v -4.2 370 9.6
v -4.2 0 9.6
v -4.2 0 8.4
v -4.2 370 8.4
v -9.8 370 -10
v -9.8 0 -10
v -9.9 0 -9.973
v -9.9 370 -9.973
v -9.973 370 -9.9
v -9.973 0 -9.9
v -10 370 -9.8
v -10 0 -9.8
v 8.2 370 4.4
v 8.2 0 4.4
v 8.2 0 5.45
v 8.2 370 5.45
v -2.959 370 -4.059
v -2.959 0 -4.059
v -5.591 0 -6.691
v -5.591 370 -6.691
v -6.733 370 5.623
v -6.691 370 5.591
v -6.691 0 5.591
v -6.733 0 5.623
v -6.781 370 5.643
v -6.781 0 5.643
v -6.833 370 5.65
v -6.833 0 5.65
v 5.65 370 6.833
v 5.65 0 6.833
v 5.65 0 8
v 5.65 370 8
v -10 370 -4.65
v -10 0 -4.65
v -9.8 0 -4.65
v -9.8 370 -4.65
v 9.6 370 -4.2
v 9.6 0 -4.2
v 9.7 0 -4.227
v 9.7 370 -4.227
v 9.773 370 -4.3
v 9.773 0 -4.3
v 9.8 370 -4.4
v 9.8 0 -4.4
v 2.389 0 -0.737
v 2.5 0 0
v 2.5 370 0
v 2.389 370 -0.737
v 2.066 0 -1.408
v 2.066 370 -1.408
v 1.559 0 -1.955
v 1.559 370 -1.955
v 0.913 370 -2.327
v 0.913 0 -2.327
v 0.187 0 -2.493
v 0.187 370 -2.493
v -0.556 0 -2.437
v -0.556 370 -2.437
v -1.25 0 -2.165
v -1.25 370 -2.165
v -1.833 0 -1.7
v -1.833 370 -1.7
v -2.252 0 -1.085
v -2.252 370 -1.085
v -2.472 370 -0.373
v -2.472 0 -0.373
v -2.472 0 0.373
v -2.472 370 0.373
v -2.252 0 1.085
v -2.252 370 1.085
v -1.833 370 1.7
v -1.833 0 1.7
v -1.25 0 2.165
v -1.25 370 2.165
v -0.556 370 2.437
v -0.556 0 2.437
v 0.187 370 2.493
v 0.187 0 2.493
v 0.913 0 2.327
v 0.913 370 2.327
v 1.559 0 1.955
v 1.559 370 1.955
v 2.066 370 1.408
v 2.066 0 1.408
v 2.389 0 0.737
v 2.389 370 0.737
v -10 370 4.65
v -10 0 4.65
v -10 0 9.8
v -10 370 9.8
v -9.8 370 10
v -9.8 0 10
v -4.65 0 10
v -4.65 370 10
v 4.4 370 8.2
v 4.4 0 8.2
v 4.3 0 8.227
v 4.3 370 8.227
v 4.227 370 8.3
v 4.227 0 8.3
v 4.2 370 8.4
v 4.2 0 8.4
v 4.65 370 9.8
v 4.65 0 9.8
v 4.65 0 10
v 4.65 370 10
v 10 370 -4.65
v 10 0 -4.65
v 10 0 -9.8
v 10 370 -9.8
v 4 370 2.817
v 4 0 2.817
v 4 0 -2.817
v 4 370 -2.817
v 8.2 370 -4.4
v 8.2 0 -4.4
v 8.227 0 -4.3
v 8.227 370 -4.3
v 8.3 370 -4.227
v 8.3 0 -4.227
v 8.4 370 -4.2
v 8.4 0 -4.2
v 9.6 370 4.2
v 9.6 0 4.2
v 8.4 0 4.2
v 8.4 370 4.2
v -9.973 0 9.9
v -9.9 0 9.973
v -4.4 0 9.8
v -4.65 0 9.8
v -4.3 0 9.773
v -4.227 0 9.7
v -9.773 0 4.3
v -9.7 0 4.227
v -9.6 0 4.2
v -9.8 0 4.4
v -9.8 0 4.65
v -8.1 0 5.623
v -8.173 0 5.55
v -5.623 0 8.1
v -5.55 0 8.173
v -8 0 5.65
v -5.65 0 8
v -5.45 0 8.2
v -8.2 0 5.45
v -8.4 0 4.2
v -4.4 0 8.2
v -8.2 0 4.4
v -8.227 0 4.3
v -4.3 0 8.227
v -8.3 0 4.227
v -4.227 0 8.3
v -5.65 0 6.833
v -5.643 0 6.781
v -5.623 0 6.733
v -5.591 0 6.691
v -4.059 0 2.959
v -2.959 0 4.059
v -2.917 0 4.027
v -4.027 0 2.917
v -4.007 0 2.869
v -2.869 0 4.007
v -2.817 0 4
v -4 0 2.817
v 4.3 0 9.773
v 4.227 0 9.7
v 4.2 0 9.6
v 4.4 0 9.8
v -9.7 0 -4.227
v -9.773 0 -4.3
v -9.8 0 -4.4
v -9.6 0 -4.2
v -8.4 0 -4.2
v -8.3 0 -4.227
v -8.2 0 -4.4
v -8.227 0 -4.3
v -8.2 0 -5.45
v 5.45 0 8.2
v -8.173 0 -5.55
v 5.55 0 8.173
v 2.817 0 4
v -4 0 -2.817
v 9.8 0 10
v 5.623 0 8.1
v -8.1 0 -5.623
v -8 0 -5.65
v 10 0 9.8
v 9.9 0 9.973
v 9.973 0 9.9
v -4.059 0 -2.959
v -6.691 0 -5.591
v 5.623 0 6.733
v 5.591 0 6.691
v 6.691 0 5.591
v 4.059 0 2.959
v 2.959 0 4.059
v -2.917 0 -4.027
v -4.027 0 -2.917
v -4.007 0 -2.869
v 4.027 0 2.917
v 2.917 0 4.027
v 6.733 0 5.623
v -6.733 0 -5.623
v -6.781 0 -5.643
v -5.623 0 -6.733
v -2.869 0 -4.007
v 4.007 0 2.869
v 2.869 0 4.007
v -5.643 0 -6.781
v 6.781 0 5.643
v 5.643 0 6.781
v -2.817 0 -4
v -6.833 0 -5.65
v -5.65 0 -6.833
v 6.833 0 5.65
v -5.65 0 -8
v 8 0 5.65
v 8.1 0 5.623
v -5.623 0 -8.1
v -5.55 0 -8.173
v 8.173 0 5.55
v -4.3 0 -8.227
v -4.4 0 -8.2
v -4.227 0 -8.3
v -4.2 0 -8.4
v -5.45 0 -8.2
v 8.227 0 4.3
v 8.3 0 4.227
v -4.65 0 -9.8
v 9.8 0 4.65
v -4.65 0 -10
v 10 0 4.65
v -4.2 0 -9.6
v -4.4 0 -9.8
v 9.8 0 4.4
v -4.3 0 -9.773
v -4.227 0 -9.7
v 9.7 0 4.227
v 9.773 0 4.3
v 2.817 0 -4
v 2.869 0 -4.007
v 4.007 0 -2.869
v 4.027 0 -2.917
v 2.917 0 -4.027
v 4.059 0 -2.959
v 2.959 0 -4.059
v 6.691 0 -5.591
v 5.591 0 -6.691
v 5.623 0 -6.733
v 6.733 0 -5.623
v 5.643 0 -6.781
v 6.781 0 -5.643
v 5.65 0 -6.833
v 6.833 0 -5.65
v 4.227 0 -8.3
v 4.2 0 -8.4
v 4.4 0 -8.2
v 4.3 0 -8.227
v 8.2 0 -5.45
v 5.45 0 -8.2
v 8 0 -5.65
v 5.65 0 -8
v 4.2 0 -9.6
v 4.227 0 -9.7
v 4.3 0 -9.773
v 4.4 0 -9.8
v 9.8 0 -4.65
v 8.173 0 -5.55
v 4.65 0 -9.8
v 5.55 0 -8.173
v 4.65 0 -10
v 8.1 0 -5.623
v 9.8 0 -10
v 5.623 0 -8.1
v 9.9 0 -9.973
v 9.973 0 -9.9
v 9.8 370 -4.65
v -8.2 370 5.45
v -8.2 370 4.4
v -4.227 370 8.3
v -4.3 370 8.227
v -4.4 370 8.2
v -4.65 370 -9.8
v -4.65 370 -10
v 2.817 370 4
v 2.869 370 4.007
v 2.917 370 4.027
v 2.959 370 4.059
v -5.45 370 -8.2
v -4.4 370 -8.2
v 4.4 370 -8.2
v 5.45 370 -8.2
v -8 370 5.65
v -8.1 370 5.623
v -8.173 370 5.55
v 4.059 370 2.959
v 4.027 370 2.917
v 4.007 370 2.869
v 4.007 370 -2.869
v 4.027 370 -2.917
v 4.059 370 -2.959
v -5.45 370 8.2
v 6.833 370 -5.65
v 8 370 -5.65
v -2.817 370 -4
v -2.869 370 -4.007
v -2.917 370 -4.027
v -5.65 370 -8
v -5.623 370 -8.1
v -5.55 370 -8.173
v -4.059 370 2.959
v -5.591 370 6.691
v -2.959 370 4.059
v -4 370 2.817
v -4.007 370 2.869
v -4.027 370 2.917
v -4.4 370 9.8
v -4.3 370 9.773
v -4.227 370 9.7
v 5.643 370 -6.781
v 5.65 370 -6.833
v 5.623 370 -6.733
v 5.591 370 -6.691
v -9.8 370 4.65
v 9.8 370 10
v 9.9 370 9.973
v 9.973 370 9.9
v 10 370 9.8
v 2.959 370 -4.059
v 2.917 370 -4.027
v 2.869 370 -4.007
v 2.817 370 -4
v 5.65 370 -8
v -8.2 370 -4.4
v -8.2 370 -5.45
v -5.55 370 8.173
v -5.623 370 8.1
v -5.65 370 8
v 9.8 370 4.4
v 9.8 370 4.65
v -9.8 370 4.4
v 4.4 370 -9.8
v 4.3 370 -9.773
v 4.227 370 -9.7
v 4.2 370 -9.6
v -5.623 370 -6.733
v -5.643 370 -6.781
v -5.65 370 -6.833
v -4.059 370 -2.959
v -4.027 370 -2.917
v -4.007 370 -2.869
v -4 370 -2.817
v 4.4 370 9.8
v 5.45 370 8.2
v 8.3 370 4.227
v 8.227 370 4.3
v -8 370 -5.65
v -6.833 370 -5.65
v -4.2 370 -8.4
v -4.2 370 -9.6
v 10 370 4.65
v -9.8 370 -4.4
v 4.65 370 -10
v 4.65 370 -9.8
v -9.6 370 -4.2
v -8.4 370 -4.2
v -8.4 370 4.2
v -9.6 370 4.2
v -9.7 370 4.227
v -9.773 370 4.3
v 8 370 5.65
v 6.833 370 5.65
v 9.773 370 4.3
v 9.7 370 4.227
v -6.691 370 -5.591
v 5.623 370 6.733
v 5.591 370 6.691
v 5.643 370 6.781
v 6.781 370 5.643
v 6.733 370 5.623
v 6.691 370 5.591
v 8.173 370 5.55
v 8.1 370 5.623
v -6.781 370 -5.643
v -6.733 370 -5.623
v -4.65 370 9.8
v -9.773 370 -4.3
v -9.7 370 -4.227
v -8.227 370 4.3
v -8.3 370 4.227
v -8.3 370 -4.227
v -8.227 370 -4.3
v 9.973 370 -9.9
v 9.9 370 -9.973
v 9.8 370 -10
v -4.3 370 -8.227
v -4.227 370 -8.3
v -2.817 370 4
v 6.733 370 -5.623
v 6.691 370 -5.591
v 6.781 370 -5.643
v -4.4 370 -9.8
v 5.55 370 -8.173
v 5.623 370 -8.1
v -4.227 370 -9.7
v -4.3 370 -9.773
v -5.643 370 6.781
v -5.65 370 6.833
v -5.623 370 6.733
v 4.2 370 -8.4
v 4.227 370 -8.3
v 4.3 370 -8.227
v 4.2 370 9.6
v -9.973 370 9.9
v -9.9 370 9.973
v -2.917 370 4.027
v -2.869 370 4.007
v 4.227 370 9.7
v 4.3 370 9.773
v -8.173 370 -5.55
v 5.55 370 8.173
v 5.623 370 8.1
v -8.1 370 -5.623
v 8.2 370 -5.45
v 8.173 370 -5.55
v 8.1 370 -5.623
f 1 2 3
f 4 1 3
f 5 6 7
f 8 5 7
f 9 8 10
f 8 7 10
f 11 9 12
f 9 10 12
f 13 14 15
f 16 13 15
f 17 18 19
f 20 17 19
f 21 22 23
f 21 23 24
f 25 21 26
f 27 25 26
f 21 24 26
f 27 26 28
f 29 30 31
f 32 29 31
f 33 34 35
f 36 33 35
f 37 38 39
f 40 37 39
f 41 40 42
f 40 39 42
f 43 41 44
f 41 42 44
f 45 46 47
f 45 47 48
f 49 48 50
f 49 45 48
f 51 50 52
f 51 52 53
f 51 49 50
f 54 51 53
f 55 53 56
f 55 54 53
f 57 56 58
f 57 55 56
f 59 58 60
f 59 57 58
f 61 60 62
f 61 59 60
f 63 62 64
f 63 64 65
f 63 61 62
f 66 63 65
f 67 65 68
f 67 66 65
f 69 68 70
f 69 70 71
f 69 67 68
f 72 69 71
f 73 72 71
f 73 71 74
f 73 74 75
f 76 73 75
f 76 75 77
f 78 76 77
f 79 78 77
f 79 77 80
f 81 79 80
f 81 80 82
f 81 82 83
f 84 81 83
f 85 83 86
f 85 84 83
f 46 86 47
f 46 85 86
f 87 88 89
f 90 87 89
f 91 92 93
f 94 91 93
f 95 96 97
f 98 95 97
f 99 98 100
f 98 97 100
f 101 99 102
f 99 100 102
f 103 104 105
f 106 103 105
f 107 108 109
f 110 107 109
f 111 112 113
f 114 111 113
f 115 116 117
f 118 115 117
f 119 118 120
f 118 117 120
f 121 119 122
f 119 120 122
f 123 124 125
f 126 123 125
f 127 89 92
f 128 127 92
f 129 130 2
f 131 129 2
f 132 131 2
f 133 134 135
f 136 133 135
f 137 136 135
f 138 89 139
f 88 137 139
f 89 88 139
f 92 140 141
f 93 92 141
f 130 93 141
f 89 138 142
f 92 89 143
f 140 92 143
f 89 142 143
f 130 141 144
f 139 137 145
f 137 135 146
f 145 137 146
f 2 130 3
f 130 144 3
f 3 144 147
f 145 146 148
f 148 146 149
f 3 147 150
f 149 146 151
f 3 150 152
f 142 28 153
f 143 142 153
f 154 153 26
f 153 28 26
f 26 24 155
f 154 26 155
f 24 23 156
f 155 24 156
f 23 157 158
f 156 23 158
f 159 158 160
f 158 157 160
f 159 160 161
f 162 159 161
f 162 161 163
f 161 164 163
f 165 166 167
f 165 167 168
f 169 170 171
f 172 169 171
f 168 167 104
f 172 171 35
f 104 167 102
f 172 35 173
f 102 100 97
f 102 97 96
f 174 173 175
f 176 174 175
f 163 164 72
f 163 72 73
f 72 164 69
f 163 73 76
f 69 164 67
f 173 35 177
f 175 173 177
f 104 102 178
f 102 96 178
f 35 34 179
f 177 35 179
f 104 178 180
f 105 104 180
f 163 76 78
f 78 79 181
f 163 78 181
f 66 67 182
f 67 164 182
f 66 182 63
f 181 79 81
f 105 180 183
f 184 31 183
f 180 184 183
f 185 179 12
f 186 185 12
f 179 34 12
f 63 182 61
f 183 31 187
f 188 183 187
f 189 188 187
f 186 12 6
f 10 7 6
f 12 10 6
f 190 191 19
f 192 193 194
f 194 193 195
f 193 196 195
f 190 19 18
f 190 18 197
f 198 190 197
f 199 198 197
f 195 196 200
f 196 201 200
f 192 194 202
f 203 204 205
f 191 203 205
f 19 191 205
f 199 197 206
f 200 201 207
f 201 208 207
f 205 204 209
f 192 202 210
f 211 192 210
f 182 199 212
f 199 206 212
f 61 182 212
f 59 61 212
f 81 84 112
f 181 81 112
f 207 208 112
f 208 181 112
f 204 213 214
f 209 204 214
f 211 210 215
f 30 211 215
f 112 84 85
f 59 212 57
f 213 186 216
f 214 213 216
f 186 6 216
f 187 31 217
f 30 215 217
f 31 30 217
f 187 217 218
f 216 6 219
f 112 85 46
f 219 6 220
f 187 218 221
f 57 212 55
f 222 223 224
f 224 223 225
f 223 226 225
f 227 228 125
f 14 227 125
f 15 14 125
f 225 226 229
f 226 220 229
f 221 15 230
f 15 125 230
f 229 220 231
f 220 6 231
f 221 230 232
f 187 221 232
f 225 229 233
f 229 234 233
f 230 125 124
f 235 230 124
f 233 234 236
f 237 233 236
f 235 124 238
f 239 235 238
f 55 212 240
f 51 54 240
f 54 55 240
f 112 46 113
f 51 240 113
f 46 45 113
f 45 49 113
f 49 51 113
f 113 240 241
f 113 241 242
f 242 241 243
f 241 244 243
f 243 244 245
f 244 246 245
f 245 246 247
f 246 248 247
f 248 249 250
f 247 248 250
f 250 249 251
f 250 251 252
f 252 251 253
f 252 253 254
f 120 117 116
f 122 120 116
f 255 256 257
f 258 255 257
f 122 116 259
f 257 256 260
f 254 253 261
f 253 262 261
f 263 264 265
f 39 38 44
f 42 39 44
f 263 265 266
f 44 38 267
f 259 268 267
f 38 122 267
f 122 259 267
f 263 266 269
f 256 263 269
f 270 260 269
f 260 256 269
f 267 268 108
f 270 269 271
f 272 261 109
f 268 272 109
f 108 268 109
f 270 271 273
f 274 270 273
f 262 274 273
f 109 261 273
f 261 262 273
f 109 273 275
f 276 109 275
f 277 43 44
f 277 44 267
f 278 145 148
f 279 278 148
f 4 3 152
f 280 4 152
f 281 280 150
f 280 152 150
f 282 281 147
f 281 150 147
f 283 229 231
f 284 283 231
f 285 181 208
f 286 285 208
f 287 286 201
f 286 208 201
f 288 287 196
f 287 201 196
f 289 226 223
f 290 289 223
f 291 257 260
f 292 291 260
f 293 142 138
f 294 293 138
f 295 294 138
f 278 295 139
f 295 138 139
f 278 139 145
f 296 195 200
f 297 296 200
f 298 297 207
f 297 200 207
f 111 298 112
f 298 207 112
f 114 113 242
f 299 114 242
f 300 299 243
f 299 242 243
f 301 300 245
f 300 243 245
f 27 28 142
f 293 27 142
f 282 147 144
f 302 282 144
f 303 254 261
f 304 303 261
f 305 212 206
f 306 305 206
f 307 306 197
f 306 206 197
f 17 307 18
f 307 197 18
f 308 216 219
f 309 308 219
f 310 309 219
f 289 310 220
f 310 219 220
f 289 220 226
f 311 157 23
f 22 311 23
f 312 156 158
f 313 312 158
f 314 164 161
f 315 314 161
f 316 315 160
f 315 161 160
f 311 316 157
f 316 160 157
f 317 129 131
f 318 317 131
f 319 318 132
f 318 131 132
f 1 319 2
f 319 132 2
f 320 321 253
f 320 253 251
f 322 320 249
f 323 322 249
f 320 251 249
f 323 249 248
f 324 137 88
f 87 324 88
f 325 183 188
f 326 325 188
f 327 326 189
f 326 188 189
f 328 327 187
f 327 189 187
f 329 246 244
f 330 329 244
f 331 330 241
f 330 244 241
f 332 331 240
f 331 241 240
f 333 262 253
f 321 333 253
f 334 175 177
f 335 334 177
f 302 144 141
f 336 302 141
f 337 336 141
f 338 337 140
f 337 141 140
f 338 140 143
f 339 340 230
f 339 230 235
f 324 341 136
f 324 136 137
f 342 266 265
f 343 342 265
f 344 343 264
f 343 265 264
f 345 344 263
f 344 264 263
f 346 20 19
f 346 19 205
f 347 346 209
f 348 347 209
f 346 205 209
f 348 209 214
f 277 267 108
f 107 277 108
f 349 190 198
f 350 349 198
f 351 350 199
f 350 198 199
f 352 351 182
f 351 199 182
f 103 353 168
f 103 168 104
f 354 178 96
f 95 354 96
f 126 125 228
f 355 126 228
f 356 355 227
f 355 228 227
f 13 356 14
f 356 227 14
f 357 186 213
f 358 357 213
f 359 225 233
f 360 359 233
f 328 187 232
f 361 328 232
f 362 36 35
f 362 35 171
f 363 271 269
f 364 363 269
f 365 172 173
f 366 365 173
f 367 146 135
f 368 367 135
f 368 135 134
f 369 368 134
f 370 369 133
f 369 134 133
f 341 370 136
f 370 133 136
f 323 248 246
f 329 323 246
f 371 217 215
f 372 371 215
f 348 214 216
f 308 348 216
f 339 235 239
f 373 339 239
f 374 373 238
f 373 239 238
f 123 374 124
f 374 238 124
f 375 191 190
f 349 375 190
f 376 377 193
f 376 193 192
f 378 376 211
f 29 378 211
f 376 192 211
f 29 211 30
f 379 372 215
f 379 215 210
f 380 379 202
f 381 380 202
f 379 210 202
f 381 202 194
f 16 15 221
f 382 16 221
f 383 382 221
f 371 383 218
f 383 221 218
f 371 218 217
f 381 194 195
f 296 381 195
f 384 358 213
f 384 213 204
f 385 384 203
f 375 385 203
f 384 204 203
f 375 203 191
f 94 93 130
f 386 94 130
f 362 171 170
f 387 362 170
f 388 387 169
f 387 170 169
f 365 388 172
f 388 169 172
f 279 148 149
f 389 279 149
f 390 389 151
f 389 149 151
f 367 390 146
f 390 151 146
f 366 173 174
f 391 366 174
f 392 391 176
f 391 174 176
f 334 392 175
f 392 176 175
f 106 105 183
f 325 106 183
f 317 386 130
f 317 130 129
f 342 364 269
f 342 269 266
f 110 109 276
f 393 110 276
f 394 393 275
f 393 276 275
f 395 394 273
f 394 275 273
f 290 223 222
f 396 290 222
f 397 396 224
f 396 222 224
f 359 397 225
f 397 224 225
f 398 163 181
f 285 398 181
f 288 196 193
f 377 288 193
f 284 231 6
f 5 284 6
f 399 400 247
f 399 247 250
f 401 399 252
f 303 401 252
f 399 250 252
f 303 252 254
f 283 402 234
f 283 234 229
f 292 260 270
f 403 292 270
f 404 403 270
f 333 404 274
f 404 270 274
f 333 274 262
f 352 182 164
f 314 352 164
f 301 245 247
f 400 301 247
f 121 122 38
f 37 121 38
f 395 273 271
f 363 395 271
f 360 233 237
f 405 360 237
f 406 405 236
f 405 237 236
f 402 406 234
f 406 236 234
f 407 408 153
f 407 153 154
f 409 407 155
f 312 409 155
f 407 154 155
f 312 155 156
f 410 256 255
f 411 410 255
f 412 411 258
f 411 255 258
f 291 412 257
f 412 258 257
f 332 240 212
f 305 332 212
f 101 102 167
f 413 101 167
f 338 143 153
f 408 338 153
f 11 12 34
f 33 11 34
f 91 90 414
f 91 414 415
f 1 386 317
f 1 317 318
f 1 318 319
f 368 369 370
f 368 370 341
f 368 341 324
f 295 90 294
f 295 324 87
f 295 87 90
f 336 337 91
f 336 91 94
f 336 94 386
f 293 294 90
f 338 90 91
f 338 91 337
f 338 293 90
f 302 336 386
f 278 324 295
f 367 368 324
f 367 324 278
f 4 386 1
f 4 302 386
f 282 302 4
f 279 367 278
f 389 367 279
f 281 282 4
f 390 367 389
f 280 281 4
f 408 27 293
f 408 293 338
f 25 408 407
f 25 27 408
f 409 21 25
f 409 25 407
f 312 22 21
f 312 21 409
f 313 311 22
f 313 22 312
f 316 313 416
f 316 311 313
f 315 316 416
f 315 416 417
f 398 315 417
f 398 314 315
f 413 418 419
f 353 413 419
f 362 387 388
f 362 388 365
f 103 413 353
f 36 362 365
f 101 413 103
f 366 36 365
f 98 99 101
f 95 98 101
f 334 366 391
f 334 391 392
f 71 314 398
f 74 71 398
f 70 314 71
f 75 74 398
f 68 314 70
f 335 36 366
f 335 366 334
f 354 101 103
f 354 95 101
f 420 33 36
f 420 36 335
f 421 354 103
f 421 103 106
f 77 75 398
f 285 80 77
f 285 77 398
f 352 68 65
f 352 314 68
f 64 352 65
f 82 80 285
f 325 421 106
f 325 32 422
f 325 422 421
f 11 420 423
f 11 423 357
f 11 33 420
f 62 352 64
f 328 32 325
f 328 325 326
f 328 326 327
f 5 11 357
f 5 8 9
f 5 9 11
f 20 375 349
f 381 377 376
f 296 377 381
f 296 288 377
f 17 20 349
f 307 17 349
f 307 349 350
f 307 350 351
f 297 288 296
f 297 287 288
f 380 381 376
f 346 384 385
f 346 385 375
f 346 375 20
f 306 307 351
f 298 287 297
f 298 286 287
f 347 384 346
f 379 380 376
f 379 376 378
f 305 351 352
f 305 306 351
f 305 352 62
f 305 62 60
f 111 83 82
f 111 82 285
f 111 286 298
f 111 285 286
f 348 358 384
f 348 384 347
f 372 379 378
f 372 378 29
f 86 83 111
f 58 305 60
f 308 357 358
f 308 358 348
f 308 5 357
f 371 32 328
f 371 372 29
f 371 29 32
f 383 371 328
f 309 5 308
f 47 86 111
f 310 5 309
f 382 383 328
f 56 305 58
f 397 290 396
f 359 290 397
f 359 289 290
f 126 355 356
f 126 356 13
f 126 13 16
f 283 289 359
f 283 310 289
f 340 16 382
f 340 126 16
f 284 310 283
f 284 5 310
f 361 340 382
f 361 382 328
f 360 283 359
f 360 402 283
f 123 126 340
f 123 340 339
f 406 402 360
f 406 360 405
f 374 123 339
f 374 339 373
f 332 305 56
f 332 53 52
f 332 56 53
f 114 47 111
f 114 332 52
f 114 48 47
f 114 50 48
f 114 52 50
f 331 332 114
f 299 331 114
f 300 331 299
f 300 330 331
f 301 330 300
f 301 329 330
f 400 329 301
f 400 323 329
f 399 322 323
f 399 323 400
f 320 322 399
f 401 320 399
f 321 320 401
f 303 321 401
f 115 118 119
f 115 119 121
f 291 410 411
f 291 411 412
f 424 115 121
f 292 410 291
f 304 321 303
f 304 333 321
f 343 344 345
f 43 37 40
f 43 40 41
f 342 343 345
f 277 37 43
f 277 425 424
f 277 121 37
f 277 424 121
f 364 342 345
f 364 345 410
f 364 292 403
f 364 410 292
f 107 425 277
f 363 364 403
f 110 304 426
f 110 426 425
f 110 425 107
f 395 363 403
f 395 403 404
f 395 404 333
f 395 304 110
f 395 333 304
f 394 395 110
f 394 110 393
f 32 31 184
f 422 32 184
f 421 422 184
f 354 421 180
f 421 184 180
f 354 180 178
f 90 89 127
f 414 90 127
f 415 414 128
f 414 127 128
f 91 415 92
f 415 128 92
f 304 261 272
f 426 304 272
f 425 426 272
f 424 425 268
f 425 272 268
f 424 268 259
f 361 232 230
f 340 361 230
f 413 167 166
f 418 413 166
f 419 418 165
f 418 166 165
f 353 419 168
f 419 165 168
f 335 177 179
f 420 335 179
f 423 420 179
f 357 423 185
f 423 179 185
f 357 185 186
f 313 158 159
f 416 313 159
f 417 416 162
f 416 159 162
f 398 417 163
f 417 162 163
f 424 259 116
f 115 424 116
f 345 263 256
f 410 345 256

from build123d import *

# Parameters (mm, degrees)
SKETCH1_R           = 2.5
BOSS_EXTRUDE1_DEPTH = 370


with BuildPart() as part:
    # Sketch1 → Boss-Extrude1 (new body)
    with BuildSketch(Plane(origin=(0, 0, 0), x_dir=(1, 0, 0), z_dir=(0, 1, 0))):
        with BuildLine():
            Line((-10, 4.65), (-9.8, 4.65))
            Line((-9.8, 4.65), (-9.8, 4.4))
            ThreePointArc((-9.8, 4.4), (-9.741421356, 4.258578644), (-9.6, 4.2))
            Line((-9.6, 4.2), (-8.4, 4.2))
            ThreePointArc((-8.4, 4.2), (-8.258578644, 4.258578644), (-8.2, 4.4))
            Line((-8.2, 4.4), (-8.2, 5.45))
            ThreePointArc((-8.2, 5.45), (-8.141421356, 5.591421356), (-8, 5.65))
            Line((-8, 5.65), (-6.832842712, 5.65))
            ThreePointArc((-6.832842712, 5.65), (-6.756306026, 5.634775907), (-6.691421356, 5.591421356))
            Line((-6.691421356, 5.591421356), (-4.058578644, 2.958578644))
            ThreePointArc((-4.058578644, 2.958578644), (-4.015224093, 2.893693974), (-4, 2.817157288))
            Line((-4, 2.817157288), (-4, -2.817157288))
            ThreePointArc((-4, -2.817157288), (-4.015224093, -2.893693974), (-4.058578644, -2.958578644))
            Line((-4.058578644, -2.958578644), (-6.691421356, -5.591421356))
            ThreePointArc((-6.691421356, -5.591421356), (-6.756306026, -5.634775907), (-6.832842712, -5.65))
            Line((-6.832842712, -5.65), (-8, -5.65))
            ThreePointArc((-8, -5.65), (-8.141421356, -5.591421356), (-8.2, -5.45))
            Line((-8.2, -5.45), (-8.2, -4.4))
            ThreePointArc((-8.2, -4.4), (-8.258578644, -4.258578644), (-8.4, -4.2))
            Line((-8.4, -4.2), (-9.6, -4.2))
            ThreePointArc((-9.6, -4.2), (-9.741421356, -4.258578644), (-9.8, -4.4))
            Line((-9.8, -4.4), (-9.8, -4.65))
            Line((-9.8, -4.65), (-10, -4.65))
            Line((-10, -4.65), (-10, -9.8))
            ThreePointArc((-10, -9.8), (-9.941421356, -9.941421356), (-9.8, -10))
            Line((-9.8, -10), (-4.65, -10))
            Line((-4.65, -10), (-4.65, -9.8))
            Line((-4.65, -9.8), (-4.4, -9.8))
            ThreePointArc((-4.4, -9.8), (-4.258578644, -9.741421356), (-4.2, -9.6))
            Line((-4.2, -9.6), (-4.2, -8.4))
            ThreePointArc((-4.2, -8.4), (-4.258578644, -8.258578644), (-4.4, -8.2))
            Line((-4.4, -8.2), (-5.45, -8.2))
            ThreePointArc((-5.45, -8.2), (-5.591421356, -8.141421356), (-5.65, -8))
            Line((-5.65, -8), (-5.65, -6.832842712))
            ThreePointArc((-5.65, -6.832842712), (-5.634775907, -6.756306026), (-5.591421356, -6.691421356))
            Line((-5.591421356, -6.691421356), (-2.958578644, -4.058578644))
            ThreePointArc((-2.958578644, -4.058578644), (-2.893693974, -4.015224093), (-2.817157288, -4))
            Line((-2.817157288, -4), (2.817157288, -4))
            ThreePointArc((2.817157288, -4), (2.893693974, -4.015224093), (2.958578644, -4.058578644))
            Line((2.958578644, -4.058578644), (5.591421356, -6.691421356))
            ThreePointArc((5.591421356, -6.691421356), (5.634775907, -6.756306026), (5.65, -6.832842712))
            Line((5.65, -6.832842712), (5.65, -8))
            ThreePointArc((5.65, -8), (5.591421356, -8.141421356), (5.45, -8.2))
            Line((5.45, -8.2), (4.4, -8.2))
            ThreePointArc((4.4, -8.2), (4.258578644, -8.258578644), (4.2, -8.4))
            Line((4.2, -8.4), (4.2, -9.6))
            ThreePointArc((4.2, -9.6), (4.258578644, -9.741421356), (4.4, -9.8))
            Line((4.4, -9.8), (4.65, -9.8))
            Line((4.65, -9.8), (4.65, -10))
            Line((4.65, -10), (9.8, -10))
            ThreePointArc((9.8, -10), (9.941421356, -9.941421356), (10, -9.8))
            Line((10, -9.8), (10, -4.65))
            Line((10, -4.65), (9.8, -4.65))
            Line((9.8, -4.65), (9.8, -4.4))
            ThreePointArc((9.8, -4.4), (9.741421356, -4.258578644), (9.6, -4.2))
            Line((9.6, -4.2), (8.4, -4.2))
            ThreePointArc((8.4, -4.2), (8.258578644, -4.258578644), (8.2, -4.4))
            Line((8.2, -4.4), (8.2, -5.45))
            ThreePointArc((8.2, -5.45), (8.141421356, -5.591421356), (8, -5.65))
            Line((8, -5.65), (6.832842712, -5.65))
            ThreePointArc((6.832842712, -5.65), (6.756306026, -5.634775907), (6.691421356, -5.591421356))
            Line((6.691421356, -5.591421356), (4.058578644, -2.958578644))
            ThreePointArc((4.058578644, -2.958578644), (4.015224093, -2.893693974), (4, -2.817157288))
            Line((4, -2.817157288), (4, 2.817157288))
            ThreePointArc((4, 2.817157288), (4.015224093, 2.893693974), (4.058578644, 2.958578644))
            Line((4.058578644, 2.958578644), (6.691421356, 5.591421356))
            ThreePointArc((6.691421356, 5.591421356), (6.756306026, 5.634775907), (6.832842712, 5.65))
            Line((6.832842712, 5.65), (8, 5.65))
            ThreePointArc((8, 5.65), (8.141421356, 5.591421356), (8.2, 5.45))
            Line((8.2, 5.45), (8.2, 4.4))
            ThreePointArc((8.2, 4.4), (8.258578644, 4.258578644), (8.4, 4.2))
            Line((8.4, 4.2), (9.6, 4.2))
            ThreePointArc((9.6, 4.2), (9.741421356, 4.258578644), (9.8, 4.4))
            Line((9.8, 4.4), (9.8, 4.65))
            Line((9.8, 4.65), (10, 4.65))
            Line((10, 4.65), (10, 9.8))
            ThreePointArc((10, 9.8), (9.941421356, 9.941421356), (9.8, 10))
            Line((9.8, 10), (4.65, 10))
            Line((4.65, 10), (4.65, 9.8))
            Line((4.65, 9.8), (4.4, 9.8))
            ThreePointArc((4.4, 9.8), (4.258578644, 9.741421356), (4.2, 9.6))
            Line((4.2, 9.6), (4.2, 8.4))
            ThreePointArc((4.2, 8.4), (4.258578644, 8.258578644), (4.4, 8.2))
            Line((4.4, 8.2), (5.45, 8.2))
            ThreePointArc((5.45, 8.2), (5.591421356, 8.141421356), (5.65, 8))
            Line((5.65, 8), (5.65, 6.832842712))
            ThreePointArc((5.65, 6.832842712), (5.634775907, 6.756306026), (5.591421356, 6.691421356))
            Line((5.591421356, 6.691421356), (2.958578644, 4.058578644))
            ThreePointArc((2.958578644, 4.058578644), (2.893693974, 4.015224093), (2.817157288, 4))
            Line((2.817157288, 4), (-2.817157288, 4))
            ThreePointArc((-2.817157288, 4), (-2.893693974, 4.015224093), (-2.958578644, 4.058578644))
            Line((-2.958578644, 4.058578644), (-5.591421356, 6.691421356))
            ThreePointArc((-5.591421356, 6.691421356), (-5.634775907, 6.756306026), (-5.65, 6.832842712))
            Line((-5.65, 6.832842712), (-5.65, 8))
            ThreePointArc((-5.65, 8), (-5.591421356, 8.141421356), (-5.45, 8.2))
            Line((-5.45, 8.2), (-4.4, 8.2))
            ThreePointArc((-4.4, 8.2), (-4.258578644, 8.258578644), (-4.2, 8.4))
            Line((-4.2, 8.4), (-4.2, 9.6))
            ThreePointArc((-4.2, 9.6), (-4.258578644, 9.741421356), (-4.4, 9.8))
            Line((-4.4, 9.8), (-4.65, 9.8))
            Line((-4.65, 9.8), (-4.65, 10))
            Line((-4.65, 10), (-9.8, 10))
            ThreePointArc((-9.8, 10), (-9.941421356, 9.941421356), (-10, 9.8))
            Line((-10, 9.8), (-10, 4.65))
        make_face()
        Circle(SKETCH1_R, mode=Mode.SUBTRACT)
    extrude(amount=BOSS_EXTRUDE1_DEPTH)


solid = part.part
